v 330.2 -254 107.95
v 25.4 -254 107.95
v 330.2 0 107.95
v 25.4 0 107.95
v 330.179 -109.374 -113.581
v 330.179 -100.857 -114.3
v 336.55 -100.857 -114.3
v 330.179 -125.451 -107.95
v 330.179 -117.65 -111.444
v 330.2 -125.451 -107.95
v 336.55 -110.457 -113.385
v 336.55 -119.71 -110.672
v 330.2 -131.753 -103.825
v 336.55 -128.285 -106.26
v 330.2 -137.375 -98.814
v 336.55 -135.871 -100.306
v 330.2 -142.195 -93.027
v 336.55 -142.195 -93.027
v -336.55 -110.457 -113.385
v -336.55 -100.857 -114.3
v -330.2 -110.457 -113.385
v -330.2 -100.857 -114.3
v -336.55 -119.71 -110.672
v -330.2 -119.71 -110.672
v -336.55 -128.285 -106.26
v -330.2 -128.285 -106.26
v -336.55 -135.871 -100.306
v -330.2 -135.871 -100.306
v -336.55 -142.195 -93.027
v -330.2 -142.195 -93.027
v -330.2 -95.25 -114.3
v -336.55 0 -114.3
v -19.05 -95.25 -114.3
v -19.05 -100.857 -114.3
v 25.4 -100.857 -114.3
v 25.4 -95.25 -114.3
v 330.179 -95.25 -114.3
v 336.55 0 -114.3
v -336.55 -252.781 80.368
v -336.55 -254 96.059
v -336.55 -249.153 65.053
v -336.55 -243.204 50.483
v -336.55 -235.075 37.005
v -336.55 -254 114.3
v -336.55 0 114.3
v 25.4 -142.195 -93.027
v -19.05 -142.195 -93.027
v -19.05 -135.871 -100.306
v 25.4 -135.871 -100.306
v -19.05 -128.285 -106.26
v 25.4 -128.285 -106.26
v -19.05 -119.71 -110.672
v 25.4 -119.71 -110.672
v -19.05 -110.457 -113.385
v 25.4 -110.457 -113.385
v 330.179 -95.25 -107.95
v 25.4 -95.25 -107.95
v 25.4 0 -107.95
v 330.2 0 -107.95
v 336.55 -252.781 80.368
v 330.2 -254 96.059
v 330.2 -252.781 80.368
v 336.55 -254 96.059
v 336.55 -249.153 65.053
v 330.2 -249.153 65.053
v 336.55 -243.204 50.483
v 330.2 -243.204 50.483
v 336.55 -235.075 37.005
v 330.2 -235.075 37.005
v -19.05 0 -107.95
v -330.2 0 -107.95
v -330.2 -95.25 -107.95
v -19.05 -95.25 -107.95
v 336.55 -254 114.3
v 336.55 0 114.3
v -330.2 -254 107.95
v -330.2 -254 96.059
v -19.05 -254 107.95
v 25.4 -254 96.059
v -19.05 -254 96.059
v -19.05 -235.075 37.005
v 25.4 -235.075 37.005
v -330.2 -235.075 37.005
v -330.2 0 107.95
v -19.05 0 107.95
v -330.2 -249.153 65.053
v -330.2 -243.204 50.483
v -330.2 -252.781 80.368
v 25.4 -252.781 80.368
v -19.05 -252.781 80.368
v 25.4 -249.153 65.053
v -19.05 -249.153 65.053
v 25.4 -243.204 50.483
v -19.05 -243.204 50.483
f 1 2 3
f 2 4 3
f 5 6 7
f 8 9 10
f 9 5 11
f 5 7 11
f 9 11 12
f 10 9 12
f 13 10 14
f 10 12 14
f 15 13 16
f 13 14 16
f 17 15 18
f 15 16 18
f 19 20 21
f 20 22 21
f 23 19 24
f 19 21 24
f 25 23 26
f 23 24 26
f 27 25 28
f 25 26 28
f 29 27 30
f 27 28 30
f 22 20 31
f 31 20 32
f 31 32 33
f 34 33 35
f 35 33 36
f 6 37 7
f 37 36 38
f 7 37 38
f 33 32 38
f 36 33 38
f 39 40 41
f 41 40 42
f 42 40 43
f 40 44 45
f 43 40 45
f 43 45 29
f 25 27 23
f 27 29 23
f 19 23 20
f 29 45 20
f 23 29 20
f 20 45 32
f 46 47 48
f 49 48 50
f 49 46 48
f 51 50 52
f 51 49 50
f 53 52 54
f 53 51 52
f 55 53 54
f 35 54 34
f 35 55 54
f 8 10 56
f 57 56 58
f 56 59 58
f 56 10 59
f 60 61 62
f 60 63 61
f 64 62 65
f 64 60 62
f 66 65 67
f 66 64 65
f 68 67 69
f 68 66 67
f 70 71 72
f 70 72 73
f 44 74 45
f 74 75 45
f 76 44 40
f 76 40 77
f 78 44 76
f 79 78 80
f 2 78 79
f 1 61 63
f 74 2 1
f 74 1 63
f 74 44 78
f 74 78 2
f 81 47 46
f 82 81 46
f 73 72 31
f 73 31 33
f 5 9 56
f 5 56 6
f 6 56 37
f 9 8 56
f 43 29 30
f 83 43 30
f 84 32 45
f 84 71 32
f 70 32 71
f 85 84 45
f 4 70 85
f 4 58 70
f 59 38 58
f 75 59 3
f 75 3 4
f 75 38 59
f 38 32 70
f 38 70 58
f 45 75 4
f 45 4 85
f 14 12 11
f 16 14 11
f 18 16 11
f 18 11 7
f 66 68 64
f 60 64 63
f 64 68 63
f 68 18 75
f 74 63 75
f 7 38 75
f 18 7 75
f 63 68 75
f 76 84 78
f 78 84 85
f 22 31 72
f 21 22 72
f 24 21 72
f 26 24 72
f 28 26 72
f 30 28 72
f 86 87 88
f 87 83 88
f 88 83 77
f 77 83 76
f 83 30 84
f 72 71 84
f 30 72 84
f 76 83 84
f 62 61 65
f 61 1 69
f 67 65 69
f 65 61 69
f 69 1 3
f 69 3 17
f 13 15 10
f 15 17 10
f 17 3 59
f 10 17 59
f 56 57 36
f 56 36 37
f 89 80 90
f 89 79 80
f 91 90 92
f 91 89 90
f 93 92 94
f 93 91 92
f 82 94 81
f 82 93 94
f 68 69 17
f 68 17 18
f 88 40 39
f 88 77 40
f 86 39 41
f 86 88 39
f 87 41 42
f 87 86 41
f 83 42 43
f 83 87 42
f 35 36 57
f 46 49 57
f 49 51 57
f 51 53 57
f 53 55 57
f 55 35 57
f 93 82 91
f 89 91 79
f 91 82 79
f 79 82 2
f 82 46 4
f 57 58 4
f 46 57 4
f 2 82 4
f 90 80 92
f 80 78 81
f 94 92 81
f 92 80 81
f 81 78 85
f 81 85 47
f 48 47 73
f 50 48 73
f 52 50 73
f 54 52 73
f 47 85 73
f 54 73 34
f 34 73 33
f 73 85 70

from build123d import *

# Parameters (mm, degrees)
F0_W      = 660.4
F0_H      = 228.6
F0_W_2    = 320.675
F0_H_2    = 215.9
F1_DEPTH  = 127
F2_DEPTH  = 22.225
F3_DEPTH  = 6.35
F4_DEPTH  = 6.35
F5_DEPTH  = 6.35
F6_DEPTH  = 6.35
F7_W      = 311.15
F7_H      = 6.35
F7_W_2    = 304.7793038845
F8_DEPTH  = 31.75
F10_DEPTH = 127
F11_SIZE2 = 127
F11_SIZE  = 177.8
F12_R     = 101.6
F13_R     = 50.8


with BuildPart() as f1:
    # F0 (on Front) → F1 (new body)
    with BuildSketch(Plane.XZ):
        Rectangle(F0_W, F0_H)
        with Locations((-163.5125, 0)):
            Rectangle(F0_W_2, F0_H_2, mode=Mode.SUBTRACT)
        with Locations((163.5125, 0)):
            Rectangle(F0_W_2, F0_H_2, mode=Mode.SUBTRACT)
    extrude(amount=F1_DEPTH)

    # F2 (add, symmetric): a face of the model
    f2_faces = [f1.faces().sort_by_distance(p)[0] for p in [
        (3.175, -63.5, 0),
    ]]
    extrude(f2_faces, amount=F2_DEPTH, both=True)

    # F3 (add): a face of the model
    f3_faces = [f1.faces().sort_by_distance(p)[0] for p in [
        (330.2, -63.5, 0),
    ]]
    extrude(f3_faces, amount=F3_DEPTH)

    # F4 (cut): a face of the model
    f4_faces = [f1.faces().sort_by_distance(p)[0] for p in [
        (323.85, -63.5, 0),
    ]]
    extrude(f4_faces, amount=-F4_DEPTH, mode=Mode.SUBTRACT)

    # F5 (add): a face of the model
    f5_faces = [f1.faces().sort_by_distance(p)[0] for p in [
        (-330.2, -63.5, 0),
    ]]
    extrude(f5_faces, amount=F5_DEPTH)

    # F6 (cut): a face of the model
    f6_faces = [f1.faces().sort_by_distance(p)[0] for p in [
        (-323.85, -63.5, 0),
    ]]
    extrude(f6_faces, amount=-F6_DEPTH, mode=Mode.SUBTRACT)

    # F7 (on face) → F8 (cut)
    with BuildSketch(Plane.XZ.offset(127)):
        with Locations((-174.625, -111.125)):
            Rectangle(F7_W, F7_H)
        with Locations((177.7896519423, -111.125)):
            Rectangle(F7_W_2, F7_H)
    extrude(amount=-F8_DEPTH, mode=Mode.SUBTRACT)

    # F9 (on face) → F10 (join)
    with BuildSketch(Plane.XZ.offset(127)):
        Polygon((-19.05, 107.95), (-19.05, -114.3), (25.4, -114.3), (25.4, 107.95), (330.2, 107.95), (330.2, -107.95), (330.1793038845, -107.95), (330.1793038845, -114.3), (336.55, -114.3), (336.55, 114.3), (-336.55, 114.3), (-336.55, -114.3), (-330.2, -114.3), (-330.2, 107.95), align=None)
    extrude(amount=F10_DEPTH)

    # F11
    f11_edges = [f1.edges().sort_by_distance(p)[0] for p in [
        (3.175, -254, -114.3),
        (-333.375, -254, -114.3),
        (333.364652, -254, -114.3),
    ]]
    f11_side = f1.faces().sort_by_distance((1.850226, -254, 25.602564))[0]
    chamfer(f11_edges, length=F11_SIZE, length2=F11_SIZE2, reference=f11_side)

    # F12
    f12_edges = [f1.edges().sort_by_distance(p)[0] for p in [
        (3.175, -254, 63.5),
        (-333.375, -254, 63.5),
        (333.375, -254, 63.5),
    ]]
    fillet(f12_edges, radius=F12_R)

    # F13
    f13_edges = [f1.edges().sort_by_distance(p)[0] for p in [
        (3.175, -127, -114.3),
        (-333.375, -127, -114.3),
        (333.364652, -127, -114.3),
    ]]
    fillet(f13_edges, radius=F13_R)


solid = f1.part
